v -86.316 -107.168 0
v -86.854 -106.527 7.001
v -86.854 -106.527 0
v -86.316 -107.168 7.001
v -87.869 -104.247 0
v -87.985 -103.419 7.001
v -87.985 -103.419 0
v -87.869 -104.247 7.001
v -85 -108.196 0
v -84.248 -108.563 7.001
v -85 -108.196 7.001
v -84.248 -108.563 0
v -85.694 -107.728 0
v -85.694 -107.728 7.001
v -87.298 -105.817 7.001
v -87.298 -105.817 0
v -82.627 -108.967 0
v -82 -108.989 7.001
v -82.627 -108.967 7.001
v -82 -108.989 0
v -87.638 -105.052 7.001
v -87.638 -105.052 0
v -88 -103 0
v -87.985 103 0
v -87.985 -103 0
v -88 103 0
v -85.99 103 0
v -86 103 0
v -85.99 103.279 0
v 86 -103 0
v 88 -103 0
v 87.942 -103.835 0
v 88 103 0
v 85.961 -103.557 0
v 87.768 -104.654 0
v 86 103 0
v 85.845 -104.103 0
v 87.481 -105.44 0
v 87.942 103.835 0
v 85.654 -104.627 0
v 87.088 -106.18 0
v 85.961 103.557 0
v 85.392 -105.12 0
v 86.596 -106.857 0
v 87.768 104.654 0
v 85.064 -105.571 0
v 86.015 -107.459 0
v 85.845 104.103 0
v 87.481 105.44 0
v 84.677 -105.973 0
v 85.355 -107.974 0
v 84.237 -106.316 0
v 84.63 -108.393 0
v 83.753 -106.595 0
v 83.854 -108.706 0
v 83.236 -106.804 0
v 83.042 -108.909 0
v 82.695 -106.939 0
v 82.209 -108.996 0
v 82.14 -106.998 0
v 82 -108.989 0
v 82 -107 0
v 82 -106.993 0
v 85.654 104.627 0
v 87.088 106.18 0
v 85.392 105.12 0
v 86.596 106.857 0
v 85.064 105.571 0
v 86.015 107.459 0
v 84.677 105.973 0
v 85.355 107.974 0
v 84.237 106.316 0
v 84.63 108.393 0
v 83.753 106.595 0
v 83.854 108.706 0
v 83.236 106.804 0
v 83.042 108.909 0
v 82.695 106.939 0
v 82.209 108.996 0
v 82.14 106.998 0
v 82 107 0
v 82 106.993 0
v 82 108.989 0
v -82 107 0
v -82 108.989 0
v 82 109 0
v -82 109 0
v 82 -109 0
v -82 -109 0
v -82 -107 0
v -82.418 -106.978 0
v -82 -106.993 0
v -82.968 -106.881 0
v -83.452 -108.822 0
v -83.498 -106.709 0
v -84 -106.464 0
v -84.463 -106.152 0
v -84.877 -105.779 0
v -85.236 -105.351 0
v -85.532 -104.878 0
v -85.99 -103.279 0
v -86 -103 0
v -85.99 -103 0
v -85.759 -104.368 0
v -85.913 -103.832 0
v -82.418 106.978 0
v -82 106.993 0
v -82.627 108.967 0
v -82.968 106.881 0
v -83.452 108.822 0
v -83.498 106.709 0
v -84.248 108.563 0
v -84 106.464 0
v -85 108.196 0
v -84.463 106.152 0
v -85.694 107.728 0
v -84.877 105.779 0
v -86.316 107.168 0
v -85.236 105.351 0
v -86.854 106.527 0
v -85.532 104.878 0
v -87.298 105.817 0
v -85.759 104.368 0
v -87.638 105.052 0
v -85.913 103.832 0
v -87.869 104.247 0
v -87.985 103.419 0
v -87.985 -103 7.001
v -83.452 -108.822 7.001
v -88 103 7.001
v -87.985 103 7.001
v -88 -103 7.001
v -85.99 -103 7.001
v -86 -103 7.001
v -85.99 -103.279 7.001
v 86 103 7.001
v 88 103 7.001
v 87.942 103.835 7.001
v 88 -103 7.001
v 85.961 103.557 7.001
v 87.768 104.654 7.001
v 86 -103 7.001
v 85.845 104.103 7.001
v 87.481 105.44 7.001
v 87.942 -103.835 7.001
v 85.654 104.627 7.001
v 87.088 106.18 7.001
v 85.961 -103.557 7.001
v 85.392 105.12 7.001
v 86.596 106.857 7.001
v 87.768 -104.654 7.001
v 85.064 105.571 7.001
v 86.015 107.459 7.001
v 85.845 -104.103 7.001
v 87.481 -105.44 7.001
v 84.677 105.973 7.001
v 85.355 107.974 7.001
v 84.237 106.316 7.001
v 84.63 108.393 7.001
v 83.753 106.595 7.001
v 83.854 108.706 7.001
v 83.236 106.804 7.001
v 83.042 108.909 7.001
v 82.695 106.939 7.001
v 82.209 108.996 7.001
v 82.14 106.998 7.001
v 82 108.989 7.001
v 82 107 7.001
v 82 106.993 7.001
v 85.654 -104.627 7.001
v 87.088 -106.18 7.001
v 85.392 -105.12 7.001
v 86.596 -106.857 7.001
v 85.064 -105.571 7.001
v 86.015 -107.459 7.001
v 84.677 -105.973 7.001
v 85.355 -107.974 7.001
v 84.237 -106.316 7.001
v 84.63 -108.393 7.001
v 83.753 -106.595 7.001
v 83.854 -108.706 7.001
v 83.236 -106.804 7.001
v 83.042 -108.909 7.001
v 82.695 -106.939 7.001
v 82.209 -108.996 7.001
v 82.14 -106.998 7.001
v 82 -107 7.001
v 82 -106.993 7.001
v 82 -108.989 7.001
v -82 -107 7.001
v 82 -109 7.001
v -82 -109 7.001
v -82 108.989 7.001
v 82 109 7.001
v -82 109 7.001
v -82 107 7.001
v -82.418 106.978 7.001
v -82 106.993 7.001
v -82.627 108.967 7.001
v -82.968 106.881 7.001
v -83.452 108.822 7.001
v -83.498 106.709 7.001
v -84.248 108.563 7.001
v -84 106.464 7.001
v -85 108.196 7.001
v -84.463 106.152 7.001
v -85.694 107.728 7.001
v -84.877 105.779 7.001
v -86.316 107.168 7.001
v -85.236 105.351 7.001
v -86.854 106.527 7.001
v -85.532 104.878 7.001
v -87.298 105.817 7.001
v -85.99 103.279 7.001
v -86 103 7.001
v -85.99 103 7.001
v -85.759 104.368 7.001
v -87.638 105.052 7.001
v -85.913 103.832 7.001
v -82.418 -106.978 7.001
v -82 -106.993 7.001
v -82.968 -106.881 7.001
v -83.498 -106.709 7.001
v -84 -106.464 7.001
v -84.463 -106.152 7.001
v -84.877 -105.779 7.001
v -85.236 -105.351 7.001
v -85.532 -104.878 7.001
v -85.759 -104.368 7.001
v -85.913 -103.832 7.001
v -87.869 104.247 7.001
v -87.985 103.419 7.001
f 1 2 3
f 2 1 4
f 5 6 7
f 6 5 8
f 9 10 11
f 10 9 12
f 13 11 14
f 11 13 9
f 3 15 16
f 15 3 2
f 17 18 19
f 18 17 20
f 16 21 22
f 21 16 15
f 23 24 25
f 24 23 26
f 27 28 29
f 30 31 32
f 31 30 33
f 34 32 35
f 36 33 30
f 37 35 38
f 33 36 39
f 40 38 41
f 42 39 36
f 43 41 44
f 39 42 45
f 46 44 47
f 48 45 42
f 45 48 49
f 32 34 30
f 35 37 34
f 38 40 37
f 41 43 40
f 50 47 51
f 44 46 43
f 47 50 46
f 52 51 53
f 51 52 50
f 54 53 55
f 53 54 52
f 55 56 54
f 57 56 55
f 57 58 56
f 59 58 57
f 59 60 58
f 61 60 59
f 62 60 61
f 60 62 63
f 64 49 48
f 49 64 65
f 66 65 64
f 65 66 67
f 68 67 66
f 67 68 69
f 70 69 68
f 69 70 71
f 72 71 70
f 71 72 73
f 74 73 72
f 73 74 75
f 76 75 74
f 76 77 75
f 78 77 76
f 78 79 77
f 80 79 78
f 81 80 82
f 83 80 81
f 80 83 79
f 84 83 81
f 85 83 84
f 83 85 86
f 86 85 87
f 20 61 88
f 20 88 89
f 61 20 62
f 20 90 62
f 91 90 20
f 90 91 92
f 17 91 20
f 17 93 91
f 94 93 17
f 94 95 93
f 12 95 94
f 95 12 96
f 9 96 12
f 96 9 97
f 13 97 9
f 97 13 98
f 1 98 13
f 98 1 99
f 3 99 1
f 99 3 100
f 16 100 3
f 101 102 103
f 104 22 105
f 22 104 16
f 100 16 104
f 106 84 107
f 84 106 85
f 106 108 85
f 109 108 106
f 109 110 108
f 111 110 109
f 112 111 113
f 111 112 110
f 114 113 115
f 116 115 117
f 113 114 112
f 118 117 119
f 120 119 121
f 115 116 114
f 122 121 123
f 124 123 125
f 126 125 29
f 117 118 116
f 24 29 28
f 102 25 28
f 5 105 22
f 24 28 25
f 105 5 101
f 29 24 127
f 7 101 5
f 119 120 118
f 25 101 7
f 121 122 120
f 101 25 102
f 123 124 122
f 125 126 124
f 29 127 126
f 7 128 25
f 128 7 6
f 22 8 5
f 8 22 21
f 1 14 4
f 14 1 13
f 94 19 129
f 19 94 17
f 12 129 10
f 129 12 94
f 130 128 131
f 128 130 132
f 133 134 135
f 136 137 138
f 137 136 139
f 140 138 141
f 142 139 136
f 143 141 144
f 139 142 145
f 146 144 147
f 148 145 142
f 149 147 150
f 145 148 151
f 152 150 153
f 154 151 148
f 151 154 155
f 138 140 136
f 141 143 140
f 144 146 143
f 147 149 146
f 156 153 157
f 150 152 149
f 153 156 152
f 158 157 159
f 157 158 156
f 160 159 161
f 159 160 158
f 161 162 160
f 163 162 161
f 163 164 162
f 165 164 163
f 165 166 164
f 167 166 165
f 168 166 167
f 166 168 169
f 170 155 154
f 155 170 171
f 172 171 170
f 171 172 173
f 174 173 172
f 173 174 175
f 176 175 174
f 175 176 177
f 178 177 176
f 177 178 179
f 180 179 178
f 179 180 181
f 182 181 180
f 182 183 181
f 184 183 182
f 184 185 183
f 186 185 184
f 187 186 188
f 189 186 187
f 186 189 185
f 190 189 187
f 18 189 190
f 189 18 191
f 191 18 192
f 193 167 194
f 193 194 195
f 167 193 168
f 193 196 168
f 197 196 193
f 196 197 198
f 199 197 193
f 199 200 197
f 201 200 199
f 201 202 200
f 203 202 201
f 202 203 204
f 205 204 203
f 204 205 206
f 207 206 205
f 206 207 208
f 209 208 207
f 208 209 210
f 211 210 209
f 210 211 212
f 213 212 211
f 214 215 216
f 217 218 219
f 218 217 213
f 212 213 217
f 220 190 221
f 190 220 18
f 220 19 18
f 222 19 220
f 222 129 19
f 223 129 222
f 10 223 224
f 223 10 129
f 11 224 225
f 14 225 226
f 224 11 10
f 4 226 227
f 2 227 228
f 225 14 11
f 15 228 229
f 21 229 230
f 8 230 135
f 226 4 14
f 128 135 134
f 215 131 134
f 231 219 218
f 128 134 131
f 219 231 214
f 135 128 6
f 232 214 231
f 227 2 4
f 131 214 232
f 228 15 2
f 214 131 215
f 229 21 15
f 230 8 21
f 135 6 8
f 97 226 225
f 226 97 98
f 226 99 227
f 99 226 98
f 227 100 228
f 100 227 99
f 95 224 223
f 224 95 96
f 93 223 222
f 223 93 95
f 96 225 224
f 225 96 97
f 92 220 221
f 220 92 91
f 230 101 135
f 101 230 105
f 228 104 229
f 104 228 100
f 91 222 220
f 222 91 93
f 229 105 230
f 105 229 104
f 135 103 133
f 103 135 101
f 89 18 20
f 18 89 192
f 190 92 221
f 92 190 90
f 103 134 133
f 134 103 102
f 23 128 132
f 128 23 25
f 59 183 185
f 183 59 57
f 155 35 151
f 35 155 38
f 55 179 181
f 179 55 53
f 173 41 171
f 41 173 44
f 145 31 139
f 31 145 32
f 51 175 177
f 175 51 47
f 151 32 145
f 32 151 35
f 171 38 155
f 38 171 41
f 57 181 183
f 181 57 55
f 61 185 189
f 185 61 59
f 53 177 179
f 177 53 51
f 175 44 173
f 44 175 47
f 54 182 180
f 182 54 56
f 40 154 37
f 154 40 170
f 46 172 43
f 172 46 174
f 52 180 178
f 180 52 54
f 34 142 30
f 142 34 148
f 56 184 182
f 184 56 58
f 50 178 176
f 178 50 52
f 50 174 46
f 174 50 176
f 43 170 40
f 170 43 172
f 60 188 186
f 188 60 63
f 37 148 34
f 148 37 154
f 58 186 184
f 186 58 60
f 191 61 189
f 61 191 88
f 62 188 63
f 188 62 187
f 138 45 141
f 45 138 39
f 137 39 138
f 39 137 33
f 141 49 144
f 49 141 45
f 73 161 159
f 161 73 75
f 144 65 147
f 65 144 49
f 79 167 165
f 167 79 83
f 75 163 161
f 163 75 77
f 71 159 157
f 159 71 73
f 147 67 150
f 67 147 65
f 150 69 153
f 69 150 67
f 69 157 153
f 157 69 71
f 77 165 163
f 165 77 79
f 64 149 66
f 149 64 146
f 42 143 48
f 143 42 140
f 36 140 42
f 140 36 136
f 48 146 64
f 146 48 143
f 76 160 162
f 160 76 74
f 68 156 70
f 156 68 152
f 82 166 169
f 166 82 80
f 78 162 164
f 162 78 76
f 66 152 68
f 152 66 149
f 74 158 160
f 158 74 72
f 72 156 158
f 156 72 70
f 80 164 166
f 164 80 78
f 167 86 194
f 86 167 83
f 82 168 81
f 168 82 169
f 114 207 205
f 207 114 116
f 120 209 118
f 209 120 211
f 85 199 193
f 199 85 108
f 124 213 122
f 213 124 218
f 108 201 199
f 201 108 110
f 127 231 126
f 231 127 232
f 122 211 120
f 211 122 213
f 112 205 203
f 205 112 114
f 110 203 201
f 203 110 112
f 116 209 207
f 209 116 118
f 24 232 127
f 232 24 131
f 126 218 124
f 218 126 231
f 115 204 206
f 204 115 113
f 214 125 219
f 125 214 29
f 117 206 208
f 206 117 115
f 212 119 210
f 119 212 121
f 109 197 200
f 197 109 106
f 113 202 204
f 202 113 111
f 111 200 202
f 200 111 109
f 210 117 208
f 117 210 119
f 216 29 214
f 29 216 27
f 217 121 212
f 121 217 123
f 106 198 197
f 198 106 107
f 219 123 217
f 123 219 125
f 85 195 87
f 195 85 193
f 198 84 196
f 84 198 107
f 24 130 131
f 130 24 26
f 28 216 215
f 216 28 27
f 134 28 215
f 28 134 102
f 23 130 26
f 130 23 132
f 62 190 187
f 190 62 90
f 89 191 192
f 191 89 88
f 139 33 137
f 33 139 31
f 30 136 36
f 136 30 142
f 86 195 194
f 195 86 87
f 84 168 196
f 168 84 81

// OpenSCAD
// gridfinity parameters; feel free to edit for customization, but don't if you want compatibility
$fa = 8;
$fs = 0.25;
grid = 42;
bpod = 4;

/* user parameters
    gridx,gridy = same as always
    wallx,wally = thickness of walls in x,y
    u = height of walls above baseplate (x7mm)
*/
gridx = 4;
gridy = 5;
wall = 2;
u = 1;

// shape drawing and parameter math; do not change
overlap = 0.001;
height = u==0 ? 0 : 7*u+overlap;
cubex = grid*gridx;
cubey = grid*gridy;

translate([-(cubex+bpod)/2-wall,-(cubey+bpod)/2-wall,0])
union() {
   intersection() { // corner 1 (quadrant )
      difference() {
         translate([bpod+wall,bpod+wall,0])
            cylinder(h=height,r=bpod+wall);
         translate([bpod+wall,bpod+wall,-overlap])
            cylinder(h=height+2*overlap,r=bpod);
      }
      cube([bpod+wall,bpod+wall,height]);
   }
   translate([cubex+wall,0,0])
   intersection() { // corner 2 (quadrant )
      difference() {
         translate([0,bpod+wall,0])
            cylinder(h=height,r=bpod+wall);
         translate([0,bpod+wall,-overlap])
            cylinder(h=height+2*overlap,r=bpod);
      }
      cube([bpod+wall,bpod+wall,height]);
   }
   translate([cubex+wall,cubey+wall,0])
   intersection() { // corner 3 (quadrant )
      difference() {
         cylinder(h=height,r=bpod+wall);
         translate([0,0,-overlap])
            cylinder(h=height+2*overlap,r=bpod);
      }
      cube([bpod+wall,bpod+wall,height]);
   }
   translate([0,cubey+wall,0])
   intersection() { // corner 4 (quadrant )
      difference() {
         translate([bpod+wall,0,0])
            cylinder(h=height,r=bpod+wall);
         translate([bpod+wall,0,-overlap])
            cylinder(h=height+2*overlap,r=bpod);
      }
      cube([bpod+wall,bpod+wall,height]);
   }
   translate([0,bpod+wall,0])
      cube([wall,cubey-bpod,height]); // side 1
   translate([bpod+wall,0,0])
      cube([cubex-bpod,wall,height]); // side 2
   translate([cubex+bpod+wall,bpod+wall,0])
      cube([wall,cubey-bpod,height]); // side 3
   translate([bpod+wall,cubey+bpod+wall,0])
      cube([cubex-bpod,wall,height]); // side 4
}
